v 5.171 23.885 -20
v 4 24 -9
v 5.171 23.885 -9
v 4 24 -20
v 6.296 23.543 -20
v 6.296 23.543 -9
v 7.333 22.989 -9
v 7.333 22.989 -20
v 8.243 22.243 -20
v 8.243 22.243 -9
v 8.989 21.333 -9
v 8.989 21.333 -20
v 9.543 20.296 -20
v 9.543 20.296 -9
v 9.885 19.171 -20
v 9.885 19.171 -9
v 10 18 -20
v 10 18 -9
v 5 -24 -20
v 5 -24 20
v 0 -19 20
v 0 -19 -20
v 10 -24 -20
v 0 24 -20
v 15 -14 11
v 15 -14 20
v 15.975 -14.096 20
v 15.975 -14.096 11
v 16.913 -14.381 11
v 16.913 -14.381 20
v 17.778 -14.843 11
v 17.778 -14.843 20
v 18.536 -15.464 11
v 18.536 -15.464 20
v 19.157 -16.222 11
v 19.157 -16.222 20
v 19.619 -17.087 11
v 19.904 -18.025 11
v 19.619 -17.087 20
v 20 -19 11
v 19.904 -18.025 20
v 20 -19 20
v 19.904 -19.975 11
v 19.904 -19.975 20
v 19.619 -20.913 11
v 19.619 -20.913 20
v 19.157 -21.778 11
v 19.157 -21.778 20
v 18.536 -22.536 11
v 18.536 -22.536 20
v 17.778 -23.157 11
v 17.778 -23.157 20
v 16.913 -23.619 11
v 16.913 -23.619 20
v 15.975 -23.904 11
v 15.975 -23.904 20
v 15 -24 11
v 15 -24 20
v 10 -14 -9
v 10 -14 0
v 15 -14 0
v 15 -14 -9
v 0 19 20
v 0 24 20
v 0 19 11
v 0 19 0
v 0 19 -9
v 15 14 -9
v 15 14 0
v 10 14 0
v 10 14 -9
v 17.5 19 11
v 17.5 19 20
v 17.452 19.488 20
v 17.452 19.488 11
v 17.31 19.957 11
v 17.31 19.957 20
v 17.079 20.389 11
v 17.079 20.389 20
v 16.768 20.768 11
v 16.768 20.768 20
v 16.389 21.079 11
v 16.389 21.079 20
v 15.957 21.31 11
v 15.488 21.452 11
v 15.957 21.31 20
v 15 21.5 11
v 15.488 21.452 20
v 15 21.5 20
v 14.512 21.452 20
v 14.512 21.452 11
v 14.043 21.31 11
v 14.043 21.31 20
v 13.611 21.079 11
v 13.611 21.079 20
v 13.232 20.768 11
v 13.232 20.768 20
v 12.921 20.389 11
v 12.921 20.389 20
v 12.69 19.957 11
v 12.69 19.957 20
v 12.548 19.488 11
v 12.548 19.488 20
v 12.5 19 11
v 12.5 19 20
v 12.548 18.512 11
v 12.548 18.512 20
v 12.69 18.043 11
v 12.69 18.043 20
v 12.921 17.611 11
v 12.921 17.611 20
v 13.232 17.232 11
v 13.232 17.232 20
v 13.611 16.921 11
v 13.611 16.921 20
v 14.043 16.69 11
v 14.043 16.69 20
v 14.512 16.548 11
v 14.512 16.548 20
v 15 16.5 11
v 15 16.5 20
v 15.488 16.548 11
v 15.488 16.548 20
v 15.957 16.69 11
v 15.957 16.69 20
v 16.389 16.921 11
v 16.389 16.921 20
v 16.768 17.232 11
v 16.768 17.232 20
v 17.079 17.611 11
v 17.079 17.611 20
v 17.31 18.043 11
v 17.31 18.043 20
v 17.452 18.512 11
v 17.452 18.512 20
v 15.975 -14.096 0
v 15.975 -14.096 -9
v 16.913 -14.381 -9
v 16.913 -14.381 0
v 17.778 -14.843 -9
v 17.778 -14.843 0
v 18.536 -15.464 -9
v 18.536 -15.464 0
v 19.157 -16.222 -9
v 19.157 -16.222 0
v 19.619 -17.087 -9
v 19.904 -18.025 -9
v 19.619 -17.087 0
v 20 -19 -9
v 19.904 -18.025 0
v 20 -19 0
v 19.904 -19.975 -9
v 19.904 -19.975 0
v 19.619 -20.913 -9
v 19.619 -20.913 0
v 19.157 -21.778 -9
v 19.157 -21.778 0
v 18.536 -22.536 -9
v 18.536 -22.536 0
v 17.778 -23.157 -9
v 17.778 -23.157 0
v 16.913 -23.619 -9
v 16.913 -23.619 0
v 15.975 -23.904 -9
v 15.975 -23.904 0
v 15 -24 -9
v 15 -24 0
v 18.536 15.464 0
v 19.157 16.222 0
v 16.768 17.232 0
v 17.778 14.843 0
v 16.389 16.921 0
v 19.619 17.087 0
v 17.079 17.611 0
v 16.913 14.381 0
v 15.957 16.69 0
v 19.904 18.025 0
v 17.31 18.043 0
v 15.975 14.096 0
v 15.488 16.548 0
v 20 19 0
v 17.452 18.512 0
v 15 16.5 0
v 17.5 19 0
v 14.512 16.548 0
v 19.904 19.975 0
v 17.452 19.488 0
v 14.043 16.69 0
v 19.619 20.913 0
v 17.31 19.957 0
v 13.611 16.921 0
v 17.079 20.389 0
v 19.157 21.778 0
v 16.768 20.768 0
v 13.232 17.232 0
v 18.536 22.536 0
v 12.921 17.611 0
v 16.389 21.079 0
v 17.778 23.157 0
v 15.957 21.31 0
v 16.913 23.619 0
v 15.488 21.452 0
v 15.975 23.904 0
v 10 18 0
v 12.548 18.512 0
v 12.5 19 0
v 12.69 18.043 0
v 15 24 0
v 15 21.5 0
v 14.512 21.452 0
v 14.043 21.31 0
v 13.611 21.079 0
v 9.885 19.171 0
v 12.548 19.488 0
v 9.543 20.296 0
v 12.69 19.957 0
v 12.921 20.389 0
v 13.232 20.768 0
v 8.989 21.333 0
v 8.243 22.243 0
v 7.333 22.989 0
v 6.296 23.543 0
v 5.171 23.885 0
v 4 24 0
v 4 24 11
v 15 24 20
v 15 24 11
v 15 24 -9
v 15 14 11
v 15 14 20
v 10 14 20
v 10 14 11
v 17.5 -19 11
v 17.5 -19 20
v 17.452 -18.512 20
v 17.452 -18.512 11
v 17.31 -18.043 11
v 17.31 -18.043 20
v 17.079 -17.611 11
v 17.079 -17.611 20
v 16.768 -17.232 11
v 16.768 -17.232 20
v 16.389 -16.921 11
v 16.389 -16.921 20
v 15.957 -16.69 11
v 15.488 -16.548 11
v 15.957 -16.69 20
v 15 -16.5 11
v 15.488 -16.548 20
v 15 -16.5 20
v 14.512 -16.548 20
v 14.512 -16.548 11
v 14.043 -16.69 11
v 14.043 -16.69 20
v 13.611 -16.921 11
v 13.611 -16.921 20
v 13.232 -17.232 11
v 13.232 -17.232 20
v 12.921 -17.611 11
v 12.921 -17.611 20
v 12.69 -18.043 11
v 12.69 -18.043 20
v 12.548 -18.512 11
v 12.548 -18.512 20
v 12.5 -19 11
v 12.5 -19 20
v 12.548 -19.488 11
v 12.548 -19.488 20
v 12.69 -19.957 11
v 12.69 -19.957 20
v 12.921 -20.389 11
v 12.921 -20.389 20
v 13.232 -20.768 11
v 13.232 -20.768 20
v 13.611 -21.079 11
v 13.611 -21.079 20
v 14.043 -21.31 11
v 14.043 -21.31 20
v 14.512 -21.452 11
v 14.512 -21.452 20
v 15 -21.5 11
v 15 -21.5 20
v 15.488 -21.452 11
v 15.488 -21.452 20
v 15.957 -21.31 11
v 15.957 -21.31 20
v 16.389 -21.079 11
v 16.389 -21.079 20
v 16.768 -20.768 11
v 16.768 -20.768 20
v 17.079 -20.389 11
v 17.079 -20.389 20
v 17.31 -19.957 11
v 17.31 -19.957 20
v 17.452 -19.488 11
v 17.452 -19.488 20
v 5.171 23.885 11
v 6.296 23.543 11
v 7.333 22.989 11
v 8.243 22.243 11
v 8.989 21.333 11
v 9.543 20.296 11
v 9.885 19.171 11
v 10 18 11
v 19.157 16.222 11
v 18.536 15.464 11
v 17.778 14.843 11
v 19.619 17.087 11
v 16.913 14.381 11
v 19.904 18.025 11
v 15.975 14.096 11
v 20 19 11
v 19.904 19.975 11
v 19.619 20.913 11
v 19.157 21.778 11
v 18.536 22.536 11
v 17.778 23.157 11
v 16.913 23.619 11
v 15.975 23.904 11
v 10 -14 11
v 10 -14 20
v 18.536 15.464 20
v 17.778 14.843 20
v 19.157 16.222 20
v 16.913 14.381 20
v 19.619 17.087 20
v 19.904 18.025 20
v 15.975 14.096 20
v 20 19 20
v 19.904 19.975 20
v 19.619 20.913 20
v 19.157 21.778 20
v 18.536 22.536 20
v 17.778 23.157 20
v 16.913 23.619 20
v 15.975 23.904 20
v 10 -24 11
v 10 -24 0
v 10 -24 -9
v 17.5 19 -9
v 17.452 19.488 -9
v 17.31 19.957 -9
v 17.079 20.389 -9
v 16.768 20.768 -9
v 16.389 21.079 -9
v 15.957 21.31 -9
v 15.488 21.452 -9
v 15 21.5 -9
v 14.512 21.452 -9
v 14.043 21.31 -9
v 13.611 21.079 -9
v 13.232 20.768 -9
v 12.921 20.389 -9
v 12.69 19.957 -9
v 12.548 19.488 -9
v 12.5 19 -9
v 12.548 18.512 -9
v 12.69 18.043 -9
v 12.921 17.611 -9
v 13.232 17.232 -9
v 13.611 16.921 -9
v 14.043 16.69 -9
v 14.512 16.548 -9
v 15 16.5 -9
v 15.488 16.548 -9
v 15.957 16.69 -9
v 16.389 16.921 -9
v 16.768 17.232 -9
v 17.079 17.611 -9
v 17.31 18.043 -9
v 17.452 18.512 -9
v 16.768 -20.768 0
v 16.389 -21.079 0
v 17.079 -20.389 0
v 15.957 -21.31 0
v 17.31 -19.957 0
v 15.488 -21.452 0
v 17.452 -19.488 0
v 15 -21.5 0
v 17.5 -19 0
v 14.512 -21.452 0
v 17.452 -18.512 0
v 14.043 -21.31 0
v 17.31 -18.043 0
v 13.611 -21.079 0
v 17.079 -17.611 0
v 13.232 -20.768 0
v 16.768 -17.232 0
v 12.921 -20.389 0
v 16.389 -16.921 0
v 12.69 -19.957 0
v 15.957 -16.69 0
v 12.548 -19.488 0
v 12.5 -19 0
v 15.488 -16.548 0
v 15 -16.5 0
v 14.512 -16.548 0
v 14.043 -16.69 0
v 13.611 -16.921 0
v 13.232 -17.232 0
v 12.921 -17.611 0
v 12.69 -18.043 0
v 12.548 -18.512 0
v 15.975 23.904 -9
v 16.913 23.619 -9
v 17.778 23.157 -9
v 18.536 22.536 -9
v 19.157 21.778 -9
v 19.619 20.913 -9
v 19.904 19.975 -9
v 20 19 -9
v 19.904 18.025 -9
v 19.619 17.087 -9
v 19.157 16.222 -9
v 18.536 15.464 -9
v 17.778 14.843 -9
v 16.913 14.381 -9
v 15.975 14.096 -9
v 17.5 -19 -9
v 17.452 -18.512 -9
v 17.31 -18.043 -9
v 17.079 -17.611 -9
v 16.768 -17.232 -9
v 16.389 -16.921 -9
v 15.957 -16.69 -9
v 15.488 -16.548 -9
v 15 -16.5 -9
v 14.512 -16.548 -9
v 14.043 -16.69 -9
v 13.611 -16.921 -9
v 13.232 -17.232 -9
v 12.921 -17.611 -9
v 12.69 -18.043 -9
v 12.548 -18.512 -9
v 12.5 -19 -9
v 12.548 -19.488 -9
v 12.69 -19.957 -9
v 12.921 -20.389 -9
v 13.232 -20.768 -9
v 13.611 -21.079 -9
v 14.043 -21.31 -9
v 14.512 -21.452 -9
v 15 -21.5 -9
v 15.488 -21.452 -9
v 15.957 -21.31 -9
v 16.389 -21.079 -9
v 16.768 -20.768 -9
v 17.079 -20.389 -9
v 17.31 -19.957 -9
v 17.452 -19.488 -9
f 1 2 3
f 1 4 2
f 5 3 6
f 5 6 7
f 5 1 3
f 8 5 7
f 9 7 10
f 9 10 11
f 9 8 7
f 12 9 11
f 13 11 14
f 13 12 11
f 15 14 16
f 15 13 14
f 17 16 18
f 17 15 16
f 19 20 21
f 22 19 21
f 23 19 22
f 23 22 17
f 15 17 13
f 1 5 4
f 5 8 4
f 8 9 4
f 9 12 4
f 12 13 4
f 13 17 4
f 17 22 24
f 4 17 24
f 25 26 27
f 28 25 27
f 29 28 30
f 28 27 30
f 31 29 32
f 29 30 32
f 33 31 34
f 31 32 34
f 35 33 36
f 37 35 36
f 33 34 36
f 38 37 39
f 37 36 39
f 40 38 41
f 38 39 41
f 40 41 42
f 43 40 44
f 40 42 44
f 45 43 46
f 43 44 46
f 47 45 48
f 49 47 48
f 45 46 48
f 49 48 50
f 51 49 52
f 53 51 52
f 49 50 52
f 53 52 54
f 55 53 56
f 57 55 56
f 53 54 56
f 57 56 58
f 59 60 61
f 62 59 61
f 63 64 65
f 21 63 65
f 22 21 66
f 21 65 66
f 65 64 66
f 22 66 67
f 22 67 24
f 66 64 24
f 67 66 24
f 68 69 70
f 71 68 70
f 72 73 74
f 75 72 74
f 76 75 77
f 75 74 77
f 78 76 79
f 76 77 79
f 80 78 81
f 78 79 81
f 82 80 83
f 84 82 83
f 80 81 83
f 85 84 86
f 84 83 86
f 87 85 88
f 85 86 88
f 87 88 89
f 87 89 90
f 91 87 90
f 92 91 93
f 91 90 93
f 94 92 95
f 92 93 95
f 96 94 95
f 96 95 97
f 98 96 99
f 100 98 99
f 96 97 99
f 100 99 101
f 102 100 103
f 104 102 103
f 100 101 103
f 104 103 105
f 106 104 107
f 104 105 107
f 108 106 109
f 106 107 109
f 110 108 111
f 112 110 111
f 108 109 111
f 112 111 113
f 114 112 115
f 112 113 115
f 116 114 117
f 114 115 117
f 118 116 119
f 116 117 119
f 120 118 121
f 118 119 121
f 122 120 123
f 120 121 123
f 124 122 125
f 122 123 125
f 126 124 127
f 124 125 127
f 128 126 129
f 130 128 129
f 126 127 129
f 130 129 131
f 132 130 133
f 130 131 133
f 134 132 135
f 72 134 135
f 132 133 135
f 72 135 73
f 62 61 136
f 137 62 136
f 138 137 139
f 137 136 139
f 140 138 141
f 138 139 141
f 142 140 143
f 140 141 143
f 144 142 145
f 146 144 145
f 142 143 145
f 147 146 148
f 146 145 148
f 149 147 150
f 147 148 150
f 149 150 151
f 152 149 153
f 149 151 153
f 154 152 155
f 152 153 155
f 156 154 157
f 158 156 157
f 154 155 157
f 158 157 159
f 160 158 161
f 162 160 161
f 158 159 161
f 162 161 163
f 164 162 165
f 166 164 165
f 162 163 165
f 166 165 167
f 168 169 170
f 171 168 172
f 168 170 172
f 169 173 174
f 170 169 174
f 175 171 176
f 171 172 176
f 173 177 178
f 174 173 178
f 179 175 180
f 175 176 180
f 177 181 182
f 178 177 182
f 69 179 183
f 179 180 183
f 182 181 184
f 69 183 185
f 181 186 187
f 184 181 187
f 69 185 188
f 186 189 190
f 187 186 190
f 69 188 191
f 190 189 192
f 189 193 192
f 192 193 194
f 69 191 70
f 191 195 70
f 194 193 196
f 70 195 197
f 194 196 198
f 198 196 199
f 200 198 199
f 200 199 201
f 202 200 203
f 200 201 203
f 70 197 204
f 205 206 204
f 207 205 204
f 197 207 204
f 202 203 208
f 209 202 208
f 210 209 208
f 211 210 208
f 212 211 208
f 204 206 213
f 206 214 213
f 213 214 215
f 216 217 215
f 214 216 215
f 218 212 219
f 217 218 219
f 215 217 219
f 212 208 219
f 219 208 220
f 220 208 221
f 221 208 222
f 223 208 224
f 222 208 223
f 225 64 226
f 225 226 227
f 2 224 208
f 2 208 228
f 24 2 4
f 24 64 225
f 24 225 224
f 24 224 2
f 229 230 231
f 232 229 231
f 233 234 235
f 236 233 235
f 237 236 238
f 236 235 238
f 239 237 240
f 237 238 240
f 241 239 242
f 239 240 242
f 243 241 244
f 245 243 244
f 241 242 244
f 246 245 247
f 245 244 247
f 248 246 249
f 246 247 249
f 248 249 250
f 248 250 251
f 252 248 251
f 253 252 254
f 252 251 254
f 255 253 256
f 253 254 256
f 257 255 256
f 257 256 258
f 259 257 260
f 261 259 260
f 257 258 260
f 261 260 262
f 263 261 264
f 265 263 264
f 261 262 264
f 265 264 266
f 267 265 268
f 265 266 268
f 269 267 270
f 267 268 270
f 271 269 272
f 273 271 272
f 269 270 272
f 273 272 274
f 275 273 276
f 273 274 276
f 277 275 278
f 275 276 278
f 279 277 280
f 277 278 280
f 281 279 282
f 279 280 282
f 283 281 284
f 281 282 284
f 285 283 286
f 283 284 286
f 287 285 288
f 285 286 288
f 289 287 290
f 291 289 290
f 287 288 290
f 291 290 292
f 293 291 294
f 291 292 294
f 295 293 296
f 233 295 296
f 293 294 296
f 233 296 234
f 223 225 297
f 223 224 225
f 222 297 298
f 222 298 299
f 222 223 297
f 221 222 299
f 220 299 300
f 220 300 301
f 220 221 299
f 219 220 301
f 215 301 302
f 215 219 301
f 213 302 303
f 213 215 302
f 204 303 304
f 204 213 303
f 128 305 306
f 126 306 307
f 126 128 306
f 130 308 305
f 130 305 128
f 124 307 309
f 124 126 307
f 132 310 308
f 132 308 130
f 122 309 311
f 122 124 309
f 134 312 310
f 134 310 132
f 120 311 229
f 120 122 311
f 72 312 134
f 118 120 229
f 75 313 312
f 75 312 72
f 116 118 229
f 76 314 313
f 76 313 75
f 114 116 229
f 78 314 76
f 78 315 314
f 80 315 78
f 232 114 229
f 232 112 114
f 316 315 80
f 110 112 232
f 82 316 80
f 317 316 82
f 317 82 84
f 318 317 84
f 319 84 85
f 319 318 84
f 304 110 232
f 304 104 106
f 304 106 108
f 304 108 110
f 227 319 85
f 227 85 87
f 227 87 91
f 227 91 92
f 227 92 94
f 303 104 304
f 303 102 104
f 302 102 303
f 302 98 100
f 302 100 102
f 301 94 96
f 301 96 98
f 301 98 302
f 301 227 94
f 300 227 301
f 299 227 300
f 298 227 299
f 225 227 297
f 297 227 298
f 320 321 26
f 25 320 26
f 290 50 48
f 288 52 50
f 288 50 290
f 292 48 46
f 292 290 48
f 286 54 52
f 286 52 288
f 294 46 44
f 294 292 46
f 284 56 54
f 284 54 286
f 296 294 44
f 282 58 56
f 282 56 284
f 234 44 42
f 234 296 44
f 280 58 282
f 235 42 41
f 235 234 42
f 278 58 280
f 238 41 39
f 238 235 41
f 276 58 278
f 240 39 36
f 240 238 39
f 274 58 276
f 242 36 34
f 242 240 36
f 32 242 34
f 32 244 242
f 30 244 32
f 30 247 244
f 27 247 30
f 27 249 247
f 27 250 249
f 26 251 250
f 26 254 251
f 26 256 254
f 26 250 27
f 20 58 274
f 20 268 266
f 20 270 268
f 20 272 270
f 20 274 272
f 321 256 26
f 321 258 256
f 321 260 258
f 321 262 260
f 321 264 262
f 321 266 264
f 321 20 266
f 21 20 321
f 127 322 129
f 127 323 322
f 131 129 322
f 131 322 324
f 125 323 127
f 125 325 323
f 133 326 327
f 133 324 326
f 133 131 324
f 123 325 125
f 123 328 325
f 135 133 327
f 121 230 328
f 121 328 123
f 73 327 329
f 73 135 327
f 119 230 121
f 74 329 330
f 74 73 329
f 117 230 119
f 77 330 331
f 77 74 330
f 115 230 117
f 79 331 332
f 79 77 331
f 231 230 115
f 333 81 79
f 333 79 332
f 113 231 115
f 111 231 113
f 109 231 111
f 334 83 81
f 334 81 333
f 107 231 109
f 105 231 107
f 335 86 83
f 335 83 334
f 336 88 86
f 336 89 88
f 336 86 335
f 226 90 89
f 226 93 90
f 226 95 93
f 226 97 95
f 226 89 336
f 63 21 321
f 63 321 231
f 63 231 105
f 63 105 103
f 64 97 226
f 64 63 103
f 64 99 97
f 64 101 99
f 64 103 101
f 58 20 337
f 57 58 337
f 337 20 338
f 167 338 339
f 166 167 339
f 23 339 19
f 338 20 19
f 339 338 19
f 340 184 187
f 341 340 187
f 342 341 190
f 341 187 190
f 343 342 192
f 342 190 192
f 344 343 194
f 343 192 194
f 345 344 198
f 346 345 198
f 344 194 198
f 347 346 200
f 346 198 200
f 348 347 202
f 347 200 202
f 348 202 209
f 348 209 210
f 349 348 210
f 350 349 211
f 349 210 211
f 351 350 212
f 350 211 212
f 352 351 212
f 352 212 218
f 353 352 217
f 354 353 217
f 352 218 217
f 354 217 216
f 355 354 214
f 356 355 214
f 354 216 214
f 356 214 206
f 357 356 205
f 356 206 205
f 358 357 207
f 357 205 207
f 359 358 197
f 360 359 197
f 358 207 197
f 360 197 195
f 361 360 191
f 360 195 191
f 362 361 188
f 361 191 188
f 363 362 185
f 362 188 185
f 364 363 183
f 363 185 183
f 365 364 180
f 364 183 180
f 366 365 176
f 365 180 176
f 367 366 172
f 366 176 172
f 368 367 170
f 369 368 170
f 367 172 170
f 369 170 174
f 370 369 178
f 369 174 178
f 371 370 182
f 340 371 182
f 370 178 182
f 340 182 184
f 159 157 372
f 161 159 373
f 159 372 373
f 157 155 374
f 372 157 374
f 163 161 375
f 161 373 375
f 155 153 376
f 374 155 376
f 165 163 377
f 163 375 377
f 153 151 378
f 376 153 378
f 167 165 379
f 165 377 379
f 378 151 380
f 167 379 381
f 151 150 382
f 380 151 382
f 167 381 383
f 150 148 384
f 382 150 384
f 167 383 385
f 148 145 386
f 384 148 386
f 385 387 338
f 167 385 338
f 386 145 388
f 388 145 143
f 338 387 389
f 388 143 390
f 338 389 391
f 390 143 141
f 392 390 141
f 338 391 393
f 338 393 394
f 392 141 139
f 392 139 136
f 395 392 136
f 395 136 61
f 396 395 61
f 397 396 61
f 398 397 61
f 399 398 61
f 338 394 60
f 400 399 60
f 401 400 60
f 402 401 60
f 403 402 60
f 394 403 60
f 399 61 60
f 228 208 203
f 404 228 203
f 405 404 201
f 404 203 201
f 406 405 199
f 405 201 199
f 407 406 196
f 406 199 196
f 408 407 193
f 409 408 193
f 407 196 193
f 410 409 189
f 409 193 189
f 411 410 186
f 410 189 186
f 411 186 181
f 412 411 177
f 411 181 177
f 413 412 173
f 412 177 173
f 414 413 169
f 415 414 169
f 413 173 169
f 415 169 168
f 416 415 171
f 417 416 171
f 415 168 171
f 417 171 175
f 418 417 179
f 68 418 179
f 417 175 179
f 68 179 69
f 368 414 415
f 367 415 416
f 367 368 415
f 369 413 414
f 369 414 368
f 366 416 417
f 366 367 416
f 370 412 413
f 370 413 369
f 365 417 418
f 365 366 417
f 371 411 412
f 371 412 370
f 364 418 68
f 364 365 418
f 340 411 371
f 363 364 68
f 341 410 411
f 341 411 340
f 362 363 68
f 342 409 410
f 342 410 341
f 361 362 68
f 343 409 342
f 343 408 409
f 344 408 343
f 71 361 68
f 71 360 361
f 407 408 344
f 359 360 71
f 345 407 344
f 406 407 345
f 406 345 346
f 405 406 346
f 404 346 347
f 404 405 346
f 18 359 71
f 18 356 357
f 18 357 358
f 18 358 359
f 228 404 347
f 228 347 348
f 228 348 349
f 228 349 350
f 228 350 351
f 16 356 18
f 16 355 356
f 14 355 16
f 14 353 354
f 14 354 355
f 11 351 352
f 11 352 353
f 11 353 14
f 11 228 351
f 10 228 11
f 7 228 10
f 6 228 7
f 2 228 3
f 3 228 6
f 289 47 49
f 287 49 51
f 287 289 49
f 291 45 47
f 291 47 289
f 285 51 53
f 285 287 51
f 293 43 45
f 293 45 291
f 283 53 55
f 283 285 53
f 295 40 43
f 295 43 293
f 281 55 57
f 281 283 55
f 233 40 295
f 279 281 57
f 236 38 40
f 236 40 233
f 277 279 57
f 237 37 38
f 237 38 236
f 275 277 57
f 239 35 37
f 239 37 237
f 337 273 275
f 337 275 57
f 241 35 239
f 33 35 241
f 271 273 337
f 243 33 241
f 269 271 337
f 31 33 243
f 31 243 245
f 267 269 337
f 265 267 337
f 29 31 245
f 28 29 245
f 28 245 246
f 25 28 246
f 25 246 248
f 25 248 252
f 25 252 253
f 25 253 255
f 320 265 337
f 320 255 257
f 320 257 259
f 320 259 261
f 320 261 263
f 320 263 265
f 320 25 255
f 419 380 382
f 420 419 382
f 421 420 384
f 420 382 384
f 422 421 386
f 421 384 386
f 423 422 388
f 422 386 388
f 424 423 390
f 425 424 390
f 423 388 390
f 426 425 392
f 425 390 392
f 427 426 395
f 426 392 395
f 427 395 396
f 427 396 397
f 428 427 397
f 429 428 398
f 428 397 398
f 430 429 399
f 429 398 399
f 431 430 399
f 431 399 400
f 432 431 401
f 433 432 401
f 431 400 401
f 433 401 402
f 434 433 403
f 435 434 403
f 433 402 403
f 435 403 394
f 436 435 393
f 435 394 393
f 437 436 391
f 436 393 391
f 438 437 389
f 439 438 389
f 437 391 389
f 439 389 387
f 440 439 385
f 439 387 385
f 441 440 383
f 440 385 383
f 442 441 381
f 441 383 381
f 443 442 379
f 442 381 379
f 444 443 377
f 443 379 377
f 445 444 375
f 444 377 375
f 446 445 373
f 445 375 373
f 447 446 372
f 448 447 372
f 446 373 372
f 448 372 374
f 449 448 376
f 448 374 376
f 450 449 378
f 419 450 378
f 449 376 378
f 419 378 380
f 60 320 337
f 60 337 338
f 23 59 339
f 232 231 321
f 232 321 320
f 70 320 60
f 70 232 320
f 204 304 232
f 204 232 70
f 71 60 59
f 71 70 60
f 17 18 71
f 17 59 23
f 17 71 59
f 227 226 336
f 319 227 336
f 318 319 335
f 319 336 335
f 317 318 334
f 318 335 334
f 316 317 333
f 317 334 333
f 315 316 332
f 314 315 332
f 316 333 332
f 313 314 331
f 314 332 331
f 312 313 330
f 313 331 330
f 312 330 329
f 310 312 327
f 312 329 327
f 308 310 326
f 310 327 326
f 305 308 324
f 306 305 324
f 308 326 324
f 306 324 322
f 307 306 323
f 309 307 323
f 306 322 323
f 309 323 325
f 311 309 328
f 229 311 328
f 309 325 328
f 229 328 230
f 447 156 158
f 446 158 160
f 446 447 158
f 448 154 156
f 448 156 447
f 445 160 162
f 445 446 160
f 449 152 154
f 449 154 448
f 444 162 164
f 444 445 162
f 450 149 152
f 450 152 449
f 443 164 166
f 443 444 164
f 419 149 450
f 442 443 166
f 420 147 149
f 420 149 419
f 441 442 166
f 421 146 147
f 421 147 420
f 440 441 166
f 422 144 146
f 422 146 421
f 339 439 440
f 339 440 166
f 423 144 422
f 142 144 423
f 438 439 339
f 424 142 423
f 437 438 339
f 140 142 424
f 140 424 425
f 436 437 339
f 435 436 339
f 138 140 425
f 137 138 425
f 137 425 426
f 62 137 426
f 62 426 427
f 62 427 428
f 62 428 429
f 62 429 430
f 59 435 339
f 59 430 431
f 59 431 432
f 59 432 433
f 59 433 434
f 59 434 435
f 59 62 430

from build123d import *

# Parameters (mm, degrees)
SKETCH1_W           = 40
SKETCH1_H           = 48
BOSS_EXTRUDE1_DEPTH = 10
SKETCH6_R           = 2.5
BOSS_EXTRUDE2_DEPTH = 9
LPATTERN1_COUNT     = 2
LPATTERN1_PITCH     = 20
FILLET1_R           = 6
CHAMFER2_SIZE       = 5


with BuildPart() as part:
    # Sketch1 → Boss-Extrude1 (new body)
    with BuildSketch(Plane(origin=(0, 0, 0), x_dir=(0, 0, -1), z_dir=(1, 0, 0))):
        Rectangle(SKETCH1_W, SKETCH1_H)
    extrude(amount=BOSS_EXTRUDE1_DEPTH)

    # Sketch6 → Boss-Extrude2 (add)
    with BuildSketch(Plane.XY.offset(20)):
        with BuildLine():
            Line((5, 24), (15, 24))
            ThreePointArc((15, 24), (20, 19), (15, 14))
            Line((15, 14), (5, 14))
            ThreePointArc((5, 14), (0, 19), (5, 24))
        make_face()
        with Locations((15, 19)):
            Circle(SKETCH6_R, mode=Mode.SUBTRACT)
        with BuildLine():
            Line((5, -14), (15, -14))
            ThreePointArc((15, -14), (20, -19), (15, -24))
            Line((15, -24), (5, -24))
            ThreePointArc((5, -24), (0, -19), (5, -14))
        make_face()
        with Locations((15, -19)):
            Circle(SKETCH6_R, mode=Mode.SUBTRACT)
    boss_extrude2 = extrude(amount=-BOSS_EXTRUDE2_DEPTH)

    # LPattern1: Boss-Extrude2 ×2
    with Locations(*[(0, 0, -i * LPATTERN1_PITCH) for i in range(1, LPATTERN1_COUNT)]):
        add(boss_extrude2)

    # Fillet1
    fillet1_edges = [part.edges().sort_by_distance(p)[0] for p in [
        (10, 24, 5.5),
        (10, 24, -14.5),
    ]]
    fillet(fillet1_edges, radius=FILLET1_R)

    # Chamfer2
    chamfer2_edges = [part.edges().sort_by_distance(p)[0] for p in [
        (0, -24, 0),
    ]]
    chamfer(chamfer2_edges, length=CHAMFER2_SIZE)


solid = part.part
